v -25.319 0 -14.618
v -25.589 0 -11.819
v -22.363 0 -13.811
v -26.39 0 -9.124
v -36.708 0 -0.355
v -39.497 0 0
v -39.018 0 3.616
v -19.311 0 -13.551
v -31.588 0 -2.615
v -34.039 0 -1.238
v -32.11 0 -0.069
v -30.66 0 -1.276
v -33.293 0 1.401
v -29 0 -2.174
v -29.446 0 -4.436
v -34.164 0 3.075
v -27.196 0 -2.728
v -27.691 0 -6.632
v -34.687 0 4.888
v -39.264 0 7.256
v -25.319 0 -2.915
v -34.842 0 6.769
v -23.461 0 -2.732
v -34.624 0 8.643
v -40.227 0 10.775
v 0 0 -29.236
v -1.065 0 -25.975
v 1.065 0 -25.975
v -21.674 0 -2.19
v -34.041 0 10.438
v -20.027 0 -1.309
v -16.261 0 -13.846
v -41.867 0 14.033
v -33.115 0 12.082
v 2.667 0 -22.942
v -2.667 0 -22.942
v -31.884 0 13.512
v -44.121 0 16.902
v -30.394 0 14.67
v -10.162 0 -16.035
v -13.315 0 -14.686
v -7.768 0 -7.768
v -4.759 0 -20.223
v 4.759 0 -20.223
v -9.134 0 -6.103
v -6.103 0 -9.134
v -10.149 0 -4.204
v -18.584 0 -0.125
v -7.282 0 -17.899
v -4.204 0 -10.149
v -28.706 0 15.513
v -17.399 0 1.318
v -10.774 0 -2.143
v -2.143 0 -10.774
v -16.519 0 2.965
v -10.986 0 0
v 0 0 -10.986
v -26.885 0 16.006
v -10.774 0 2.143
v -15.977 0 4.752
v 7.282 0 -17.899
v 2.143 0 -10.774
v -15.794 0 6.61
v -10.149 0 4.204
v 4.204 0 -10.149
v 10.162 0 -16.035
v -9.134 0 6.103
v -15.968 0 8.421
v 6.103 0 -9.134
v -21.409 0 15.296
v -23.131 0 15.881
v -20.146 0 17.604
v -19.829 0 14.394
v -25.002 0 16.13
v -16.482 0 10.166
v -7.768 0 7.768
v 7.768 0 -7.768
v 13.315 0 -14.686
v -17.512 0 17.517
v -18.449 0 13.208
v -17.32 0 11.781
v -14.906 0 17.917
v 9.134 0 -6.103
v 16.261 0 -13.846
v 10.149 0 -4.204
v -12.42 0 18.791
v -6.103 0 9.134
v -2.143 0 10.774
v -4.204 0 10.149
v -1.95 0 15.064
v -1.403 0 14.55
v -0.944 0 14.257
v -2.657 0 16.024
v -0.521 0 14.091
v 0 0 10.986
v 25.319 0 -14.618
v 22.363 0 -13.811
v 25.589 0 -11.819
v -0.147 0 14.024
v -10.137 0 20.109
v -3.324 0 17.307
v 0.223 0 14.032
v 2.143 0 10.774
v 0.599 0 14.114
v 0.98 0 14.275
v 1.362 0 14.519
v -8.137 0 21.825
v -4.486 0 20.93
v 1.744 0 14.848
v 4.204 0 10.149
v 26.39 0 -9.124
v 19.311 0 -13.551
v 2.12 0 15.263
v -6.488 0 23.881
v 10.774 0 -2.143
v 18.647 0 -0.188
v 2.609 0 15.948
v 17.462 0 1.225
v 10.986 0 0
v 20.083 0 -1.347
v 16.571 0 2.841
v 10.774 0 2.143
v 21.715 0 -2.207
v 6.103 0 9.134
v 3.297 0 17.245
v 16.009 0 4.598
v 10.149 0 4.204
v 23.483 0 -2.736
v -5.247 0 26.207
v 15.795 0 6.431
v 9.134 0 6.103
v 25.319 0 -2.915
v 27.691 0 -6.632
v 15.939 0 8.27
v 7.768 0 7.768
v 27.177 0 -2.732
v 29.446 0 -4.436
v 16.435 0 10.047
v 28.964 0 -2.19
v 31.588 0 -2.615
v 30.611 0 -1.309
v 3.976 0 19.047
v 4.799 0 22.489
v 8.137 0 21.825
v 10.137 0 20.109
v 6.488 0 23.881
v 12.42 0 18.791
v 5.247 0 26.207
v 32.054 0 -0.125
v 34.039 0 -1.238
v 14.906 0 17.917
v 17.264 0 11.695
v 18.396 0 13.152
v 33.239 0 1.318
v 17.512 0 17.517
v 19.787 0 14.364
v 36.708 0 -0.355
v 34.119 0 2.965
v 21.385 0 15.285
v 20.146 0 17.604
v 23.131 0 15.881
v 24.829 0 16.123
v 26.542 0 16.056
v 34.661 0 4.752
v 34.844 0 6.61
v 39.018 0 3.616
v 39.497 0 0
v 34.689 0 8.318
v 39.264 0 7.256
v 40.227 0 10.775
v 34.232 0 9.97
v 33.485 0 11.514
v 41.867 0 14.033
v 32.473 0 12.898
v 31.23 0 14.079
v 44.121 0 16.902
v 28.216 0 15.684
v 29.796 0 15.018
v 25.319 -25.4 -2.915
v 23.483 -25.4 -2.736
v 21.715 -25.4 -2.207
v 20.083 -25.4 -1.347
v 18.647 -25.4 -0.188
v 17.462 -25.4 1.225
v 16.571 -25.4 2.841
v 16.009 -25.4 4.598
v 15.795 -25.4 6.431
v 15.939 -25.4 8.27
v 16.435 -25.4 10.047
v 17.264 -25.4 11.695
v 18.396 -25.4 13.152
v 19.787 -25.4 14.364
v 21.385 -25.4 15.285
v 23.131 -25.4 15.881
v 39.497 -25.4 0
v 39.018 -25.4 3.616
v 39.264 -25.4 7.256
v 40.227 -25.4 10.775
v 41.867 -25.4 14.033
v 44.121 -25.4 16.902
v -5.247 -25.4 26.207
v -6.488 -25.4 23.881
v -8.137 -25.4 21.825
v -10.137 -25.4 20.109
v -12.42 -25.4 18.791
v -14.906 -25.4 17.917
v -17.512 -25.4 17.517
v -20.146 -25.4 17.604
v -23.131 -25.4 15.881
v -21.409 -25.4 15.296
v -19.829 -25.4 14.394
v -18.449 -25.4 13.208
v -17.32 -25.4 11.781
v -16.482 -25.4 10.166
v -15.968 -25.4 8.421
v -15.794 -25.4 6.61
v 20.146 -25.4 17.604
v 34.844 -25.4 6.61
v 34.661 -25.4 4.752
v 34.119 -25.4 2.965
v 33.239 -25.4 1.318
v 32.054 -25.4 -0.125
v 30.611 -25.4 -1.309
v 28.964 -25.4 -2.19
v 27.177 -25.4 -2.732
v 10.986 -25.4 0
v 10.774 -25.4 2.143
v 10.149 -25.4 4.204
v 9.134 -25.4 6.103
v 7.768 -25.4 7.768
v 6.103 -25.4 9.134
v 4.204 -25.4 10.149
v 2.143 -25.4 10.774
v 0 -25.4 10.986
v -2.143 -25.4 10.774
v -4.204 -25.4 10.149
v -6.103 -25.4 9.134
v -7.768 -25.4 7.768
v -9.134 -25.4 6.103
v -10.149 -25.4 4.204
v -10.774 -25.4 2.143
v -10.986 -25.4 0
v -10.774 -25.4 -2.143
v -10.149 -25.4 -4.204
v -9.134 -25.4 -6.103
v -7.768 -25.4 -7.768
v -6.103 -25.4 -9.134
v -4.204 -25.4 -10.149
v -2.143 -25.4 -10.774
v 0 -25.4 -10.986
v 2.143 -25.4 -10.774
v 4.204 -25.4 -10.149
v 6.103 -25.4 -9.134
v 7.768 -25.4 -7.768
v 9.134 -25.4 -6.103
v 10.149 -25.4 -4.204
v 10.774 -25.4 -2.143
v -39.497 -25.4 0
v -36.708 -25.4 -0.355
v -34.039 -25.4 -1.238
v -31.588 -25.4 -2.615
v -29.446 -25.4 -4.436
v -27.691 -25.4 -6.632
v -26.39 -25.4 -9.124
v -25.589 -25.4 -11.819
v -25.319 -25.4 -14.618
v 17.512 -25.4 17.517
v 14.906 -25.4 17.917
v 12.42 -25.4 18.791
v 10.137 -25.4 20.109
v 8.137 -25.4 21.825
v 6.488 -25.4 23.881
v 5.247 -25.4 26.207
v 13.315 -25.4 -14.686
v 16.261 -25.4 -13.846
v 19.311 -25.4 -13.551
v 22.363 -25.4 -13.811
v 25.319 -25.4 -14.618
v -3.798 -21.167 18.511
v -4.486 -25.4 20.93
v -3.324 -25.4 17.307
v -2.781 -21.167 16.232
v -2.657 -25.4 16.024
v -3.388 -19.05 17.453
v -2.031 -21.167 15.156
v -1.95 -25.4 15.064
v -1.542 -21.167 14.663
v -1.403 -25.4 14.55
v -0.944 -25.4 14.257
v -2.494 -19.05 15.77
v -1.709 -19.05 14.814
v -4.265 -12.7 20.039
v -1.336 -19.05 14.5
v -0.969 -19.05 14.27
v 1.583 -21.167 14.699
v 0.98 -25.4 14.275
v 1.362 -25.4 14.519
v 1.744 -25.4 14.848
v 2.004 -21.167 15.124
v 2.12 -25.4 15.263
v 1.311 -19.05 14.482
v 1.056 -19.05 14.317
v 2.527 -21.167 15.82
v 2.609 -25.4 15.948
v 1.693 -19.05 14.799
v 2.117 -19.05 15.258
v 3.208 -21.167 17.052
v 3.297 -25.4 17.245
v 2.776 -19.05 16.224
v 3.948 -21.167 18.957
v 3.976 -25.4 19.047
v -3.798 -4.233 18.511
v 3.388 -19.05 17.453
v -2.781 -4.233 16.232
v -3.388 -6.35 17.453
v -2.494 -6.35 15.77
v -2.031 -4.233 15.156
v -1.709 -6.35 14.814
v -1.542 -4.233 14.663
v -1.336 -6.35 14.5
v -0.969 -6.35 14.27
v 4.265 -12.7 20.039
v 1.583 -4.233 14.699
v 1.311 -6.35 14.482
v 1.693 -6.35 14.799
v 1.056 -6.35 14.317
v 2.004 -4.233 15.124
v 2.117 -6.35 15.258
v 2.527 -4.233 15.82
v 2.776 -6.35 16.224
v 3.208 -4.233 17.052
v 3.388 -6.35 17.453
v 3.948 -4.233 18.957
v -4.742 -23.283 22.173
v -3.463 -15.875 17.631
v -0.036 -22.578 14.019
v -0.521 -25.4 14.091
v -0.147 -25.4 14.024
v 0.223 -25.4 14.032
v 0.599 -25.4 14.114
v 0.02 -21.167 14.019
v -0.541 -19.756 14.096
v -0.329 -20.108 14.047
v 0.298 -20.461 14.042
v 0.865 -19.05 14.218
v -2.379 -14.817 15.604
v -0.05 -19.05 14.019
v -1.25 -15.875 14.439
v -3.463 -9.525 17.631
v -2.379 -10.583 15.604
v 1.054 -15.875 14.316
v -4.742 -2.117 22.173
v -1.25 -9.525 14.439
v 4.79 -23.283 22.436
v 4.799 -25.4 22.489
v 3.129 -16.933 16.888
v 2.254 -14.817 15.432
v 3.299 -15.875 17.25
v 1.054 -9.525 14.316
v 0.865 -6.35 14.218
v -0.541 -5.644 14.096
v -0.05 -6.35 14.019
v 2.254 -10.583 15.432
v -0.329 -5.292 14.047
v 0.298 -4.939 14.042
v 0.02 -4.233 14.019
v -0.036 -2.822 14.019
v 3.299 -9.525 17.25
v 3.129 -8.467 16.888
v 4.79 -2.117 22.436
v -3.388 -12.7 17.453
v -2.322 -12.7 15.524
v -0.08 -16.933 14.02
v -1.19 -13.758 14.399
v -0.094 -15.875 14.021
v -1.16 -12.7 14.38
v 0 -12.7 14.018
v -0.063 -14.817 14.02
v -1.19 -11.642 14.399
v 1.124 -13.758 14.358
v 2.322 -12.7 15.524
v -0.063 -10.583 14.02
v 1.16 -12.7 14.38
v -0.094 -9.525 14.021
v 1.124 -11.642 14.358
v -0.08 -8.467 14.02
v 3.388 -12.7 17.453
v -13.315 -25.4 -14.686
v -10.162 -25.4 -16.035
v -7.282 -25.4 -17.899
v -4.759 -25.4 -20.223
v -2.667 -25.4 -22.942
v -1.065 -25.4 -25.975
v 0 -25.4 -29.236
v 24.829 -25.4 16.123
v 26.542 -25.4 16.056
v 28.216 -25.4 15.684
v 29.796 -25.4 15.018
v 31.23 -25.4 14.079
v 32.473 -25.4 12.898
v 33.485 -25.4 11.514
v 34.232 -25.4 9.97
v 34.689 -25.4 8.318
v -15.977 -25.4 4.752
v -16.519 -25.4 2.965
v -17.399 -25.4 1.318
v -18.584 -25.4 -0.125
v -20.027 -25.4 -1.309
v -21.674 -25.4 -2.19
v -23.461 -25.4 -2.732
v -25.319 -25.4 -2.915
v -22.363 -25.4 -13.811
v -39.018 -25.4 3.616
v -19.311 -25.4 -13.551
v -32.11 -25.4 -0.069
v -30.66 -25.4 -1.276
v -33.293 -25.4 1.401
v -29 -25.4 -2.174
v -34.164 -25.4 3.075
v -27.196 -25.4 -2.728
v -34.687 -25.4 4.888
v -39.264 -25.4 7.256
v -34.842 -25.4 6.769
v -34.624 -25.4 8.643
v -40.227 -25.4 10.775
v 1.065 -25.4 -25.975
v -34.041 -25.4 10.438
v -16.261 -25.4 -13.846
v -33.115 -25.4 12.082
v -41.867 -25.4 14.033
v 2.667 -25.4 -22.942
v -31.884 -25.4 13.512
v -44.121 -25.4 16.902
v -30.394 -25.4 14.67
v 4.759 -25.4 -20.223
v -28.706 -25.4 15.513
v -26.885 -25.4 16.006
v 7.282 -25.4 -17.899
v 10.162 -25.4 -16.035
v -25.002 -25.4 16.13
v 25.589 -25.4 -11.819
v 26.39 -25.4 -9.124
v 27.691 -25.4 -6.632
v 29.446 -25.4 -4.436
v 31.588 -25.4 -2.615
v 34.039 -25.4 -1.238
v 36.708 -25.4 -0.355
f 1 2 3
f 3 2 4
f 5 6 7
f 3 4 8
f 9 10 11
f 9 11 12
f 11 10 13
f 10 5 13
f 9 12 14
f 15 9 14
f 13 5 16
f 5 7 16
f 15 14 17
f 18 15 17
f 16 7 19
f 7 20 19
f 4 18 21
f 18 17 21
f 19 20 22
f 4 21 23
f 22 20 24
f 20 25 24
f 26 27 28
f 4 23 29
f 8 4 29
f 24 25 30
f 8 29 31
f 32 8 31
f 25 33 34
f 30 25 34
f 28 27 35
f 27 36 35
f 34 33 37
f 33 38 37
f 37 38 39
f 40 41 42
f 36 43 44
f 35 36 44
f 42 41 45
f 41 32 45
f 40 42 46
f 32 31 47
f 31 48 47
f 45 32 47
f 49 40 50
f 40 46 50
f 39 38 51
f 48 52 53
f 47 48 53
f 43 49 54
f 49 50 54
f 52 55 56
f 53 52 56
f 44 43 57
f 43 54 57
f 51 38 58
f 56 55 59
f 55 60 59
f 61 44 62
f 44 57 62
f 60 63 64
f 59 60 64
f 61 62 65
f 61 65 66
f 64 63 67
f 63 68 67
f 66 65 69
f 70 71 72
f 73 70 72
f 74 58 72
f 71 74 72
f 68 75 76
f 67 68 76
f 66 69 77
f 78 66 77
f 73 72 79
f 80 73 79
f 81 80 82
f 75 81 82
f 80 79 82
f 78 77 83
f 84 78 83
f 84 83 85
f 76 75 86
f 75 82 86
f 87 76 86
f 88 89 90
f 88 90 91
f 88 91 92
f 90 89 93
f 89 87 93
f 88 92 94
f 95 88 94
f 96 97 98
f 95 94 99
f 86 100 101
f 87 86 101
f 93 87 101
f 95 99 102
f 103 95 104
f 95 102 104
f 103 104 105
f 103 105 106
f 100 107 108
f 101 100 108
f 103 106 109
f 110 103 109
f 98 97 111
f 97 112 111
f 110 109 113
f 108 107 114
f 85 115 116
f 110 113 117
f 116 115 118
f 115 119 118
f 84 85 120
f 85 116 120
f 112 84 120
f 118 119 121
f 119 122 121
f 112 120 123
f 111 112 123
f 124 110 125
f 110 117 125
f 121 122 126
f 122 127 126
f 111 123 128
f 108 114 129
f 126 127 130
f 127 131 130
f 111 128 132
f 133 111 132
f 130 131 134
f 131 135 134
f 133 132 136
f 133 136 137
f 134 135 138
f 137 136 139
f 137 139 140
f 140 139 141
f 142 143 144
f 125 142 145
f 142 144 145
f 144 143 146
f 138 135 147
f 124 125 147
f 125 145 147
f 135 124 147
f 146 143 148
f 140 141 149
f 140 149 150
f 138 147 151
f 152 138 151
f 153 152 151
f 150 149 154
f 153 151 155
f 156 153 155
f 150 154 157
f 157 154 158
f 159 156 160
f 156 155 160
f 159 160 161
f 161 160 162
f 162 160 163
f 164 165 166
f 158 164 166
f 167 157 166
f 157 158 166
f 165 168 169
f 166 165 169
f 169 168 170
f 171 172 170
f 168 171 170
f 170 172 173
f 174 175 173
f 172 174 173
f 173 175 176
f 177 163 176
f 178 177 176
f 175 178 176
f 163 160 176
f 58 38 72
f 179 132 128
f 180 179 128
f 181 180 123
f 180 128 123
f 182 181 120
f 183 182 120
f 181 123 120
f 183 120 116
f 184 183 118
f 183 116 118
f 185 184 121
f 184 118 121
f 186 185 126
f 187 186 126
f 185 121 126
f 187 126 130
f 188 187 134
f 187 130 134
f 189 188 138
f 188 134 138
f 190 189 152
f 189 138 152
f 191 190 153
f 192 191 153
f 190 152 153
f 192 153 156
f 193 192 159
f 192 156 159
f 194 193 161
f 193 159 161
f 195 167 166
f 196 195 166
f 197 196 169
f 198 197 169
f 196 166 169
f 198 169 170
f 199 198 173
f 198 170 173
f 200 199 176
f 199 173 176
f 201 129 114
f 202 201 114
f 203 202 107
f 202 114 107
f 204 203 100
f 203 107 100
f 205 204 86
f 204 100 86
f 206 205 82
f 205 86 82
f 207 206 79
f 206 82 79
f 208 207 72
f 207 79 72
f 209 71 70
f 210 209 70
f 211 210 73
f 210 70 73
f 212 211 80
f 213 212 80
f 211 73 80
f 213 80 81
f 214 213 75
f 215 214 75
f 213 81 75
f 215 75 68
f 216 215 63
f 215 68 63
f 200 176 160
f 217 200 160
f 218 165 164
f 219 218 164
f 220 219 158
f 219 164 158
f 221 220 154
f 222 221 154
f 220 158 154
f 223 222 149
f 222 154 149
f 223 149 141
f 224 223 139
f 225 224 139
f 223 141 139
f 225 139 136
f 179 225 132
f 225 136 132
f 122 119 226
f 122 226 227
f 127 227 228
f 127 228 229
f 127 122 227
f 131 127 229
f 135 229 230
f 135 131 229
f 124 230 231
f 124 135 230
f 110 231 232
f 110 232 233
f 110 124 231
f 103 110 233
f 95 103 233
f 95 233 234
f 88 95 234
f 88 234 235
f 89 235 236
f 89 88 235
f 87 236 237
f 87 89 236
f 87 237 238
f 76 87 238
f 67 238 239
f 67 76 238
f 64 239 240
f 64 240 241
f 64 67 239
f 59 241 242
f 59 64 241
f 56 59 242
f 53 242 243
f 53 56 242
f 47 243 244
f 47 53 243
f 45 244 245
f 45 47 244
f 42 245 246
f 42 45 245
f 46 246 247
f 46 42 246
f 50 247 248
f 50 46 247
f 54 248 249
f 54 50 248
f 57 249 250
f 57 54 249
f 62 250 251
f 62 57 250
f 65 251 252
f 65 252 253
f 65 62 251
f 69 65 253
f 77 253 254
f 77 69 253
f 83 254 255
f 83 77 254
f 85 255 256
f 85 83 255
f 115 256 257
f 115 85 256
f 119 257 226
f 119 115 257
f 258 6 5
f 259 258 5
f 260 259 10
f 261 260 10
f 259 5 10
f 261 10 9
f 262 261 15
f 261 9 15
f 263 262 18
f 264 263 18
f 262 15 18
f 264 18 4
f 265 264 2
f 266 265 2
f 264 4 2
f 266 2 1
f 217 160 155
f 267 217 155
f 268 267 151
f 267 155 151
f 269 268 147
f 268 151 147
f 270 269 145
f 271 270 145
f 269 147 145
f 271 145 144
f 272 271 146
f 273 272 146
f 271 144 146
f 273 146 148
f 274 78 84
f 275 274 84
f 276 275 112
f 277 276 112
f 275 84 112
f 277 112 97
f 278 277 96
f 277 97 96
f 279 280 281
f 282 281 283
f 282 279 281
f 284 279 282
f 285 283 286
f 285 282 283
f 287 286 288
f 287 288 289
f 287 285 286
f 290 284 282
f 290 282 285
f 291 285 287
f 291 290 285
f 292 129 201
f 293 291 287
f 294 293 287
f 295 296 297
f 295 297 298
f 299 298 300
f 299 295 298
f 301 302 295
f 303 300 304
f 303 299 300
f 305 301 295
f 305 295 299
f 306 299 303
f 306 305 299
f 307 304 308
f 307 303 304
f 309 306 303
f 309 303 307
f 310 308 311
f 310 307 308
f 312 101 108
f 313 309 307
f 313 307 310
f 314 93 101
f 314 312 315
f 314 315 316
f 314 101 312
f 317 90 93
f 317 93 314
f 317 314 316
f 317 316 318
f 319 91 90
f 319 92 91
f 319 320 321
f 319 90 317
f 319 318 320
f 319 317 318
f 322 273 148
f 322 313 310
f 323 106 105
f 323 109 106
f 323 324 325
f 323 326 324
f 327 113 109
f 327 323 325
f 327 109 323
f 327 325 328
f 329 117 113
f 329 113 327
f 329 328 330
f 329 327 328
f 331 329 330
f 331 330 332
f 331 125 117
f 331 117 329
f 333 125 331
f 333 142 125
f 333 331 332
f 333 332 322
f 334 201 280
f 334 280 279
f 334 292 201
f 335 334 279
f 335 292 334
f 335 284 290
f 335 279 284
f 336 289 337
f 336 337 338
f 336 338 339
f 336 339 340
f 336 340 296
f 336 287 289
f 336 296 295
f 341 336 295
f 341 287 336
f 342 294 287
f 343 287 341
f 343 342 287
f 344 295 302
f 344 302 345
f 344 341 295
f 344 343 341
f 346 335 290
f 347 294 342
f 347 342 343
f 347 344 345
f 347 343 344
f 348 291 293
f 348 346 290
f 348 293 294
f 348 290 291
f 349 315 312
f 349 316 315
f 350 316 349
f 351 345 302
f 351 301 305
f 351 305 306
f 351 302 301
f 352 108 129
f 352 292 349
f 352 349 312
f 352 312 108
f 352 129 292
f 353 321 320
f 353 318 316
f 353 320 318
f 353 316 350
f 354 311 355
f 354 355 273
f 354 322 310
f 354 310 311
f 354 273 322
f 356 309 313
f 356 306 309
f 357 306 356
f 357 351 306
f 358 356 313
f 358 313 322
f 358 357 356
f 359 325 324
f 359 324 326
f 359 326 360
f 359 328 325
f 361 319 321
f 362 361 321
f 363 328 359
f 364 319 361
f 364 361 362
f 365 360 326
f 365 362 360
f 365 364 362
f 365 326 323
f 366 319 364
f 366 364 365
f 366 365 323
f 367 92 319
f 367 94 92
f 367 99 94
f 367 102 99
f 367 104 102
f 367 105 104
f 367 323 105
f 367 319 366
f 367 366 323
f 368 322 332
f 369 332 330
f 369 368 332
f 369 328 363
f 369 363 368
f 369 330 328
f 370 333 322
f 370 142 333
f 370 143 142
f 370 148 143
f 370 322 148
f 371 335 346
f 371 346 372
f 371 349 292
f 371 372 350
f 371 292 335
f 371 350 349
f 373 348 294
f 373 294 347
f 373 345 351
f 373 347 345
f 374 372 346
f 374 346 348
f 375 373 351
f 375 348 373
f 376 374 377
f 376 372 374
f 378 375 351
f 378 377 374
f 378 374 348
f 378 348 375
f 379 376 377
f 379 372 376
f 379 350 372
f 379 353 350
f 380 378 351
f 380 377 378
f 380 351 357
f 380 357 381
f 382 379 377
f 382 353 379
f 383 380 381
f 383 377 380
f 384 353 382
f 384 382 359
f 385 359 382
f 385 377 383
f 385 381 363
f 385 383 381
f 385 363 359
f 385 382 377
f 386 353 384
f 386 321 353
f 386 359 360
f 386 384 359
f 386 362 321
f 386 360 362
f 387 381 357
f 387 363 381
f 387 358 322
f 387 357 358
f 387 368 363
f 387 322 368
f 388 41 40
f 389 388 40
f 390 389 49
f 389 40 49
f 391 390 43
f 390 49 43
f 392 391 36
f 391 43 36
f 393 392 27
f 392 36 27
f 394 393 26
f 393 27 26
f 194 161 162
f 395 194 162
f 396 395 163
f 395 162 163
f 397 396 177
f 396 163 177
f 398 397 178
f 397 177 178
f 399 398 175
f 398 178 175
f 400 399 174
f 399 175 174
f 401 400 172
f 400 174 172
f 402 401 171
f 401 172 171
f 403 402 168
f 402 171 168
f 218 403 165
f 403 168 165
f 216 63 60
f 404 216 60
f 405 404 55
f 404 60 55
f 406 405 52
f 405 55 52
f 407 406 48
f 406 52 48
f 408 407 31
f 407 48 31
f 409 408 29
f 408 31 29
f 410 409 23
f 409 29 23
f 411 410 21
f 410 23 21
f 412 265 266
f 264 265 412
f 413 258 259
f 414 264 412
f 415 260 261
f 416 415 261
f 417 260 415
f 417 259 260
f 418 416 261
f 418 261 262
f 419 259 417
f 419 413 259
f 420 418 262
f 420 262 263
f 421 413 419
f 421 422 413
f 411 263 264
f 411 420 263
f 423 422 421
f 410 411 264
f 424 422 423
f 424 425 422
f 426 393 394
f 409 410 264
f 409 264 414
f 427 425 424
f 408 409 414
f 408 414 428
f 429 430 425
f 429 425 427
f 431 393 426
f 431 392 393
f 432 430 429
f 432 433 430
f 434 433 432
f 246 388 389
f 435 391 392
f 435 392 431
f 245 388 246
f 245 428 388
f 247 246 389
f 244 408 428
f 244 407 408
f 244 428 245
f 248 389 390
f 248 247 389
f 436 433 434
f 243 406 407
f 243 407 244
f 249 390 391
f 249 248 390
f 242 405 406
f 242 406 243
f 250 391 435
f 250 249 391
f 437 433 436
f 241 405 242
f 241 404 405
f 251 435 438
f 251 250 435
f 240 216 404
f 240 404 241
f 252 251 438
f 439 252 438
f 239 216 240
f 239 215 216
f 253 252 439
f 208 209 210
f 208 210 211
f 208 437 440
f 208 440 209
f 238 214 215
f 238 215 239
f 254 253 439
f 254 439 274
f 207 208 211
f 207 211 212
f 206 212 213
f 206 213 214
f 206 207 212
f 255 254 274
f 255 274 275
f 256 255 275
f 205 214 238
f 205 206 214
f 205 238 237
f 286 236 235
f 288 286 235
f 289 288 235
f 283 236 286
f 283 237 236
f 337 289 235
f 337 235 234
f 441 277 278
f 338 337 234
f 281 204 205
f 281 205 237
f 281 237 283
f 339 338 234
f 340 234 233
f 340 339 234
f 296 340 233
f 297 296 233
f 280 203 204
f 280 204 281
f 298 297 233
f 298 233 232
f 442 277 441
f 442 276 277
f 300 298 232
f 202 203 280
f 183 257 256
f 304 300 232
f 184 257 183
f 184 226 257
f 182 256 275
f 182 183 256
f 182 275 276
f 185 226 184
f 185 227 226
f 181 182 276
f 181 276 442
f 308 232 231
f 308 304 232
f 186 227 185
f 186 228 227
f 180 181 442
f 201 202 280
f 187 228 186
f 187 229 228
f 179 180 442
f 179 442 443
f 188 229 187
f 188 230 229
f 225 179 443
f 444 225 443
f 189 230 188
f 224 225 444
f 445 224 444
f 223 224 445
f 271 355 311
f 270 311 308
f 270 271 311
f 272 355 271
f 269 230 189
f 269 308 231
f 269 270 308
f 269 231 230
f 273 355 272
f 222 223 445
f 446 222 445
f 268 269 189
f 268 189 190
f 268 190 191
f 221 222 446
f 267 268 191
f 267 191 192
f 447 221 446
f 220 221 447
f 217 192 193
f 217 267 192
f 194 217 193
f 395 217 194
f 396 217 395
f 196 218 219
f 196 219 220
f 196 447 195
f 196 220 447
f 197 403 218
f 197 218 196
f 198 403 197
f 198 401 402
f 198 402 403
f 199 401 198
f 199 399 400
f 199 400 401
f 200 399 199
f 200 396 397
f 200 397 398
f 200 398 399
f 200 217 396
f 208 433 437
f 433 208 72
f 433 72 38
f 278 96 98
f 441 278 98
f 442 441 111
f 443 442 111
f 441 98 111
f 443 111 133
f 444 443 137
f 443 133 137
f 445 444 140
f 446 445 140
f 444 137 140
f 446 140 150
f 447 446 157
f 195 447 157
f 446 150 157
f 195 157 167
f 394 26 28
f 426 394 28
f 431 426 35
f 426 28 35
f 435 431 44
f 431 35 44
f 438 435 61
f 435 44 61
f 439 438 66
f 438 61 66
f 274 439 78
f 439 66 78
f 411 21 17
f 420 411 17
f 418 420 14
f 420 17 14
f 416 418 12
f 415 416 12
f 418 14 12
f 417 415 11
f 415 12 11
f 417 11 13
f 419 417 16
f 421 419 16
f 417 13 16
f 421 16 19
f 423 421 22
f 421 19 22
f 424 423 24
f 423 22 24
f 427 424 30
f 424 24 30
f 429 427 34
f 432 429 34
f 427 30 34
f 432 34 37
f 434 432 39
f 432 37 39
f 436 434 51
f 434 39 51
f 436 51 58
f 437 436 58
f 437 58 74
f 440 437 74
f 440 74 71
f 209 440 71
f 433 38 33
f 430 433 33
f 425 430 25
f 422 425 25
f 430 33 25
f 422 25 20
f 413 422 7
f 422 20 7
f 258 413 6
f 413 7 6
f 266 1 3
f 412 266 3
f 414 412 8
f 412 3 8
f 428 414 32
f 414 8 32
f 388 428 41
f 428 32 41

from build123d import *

# Parameters (mm, degrees)
F0_R     = 10.9855
F1_DEPTH = 25.4


with BuildPart() as f1:
    # F0 (on Front) → F1 (new body)
    with BuildSketch(Plane.XZ):
        with BuildLine():
            Line((44.12074, 16.901975), (20.145995, 17.604334))
            Line((20.145995, 17.604334), (23.131371, 15.880726))
            ThreePointArc((23.131371, 15.880726), (31.230244, 14.07893), (34.843798, 6.6103))
            ThreePointArc((34.843798, 6.6103), (32.05399, -0.124892), (25.318798, -2.9147))
            Line((25.318798, -2.9147), (25.318798, -14.617815))
            ThreePointArc((25.318798, -14.617815), (29.44571, -4.435593), (39.497305, 0))
            ThreePointArc((39.497305, 0), (39.657927, 9.039407), (44.12074, 16.901975))
        make_face()
        with BuildLine():
            Line((-23.131371, 15.880726), (-20.145995, 17.604334))
            Line((-20.145995, 17.604334), (-44.12074, 16.901975))
            ThreePointArc((-44.12074, 16.901975), (-39.657927, 9.039407), (-39.497305, 0))
            ThreePointArc((-39.497305, 0), (-29.44571, -4.435593), (-25.318798, -14.617815))
            Line((-25.318798, -14.617815), (-25.318798, -2.9147))
            ThreePointArc((-25.318798, -2.9147), (-34.77994, 7.711396), (-23.131371, 15.880726))
        make_face()
        with BuildLine():
            ThreePointArc((20.145995, 17.604334), (11.247841, 19.396708), (5.246522, 26.206549))
            add(Edge.make_bspline(
                [(-5.246522, 26.206549), (-4.375539, 14.018499), (0, 14.018499), (4.375539, 14.018499), (5.246522, 26.206549)],
                knots=[1.771192, 1.771192, 1.771192, 3.141593, 3.141593, 4.511993, 4.511993, 4.511993], degree=2, weights=[1, 0.774292, 1, 0.774292, 1]))
            ThreePointArc((-5.246522, 26.206549), (-11.247841, 19.396708), (-20.145995, 17.604334))
            Line((-20.145995, 17.604334), (-23.131371, 15.880726))
            ThreePointArc((-23.131371, 15.880726), (-17.850168, 12.521746), (-15.793798, 6.6103))
            ThreePointArc((-15.793798, 6.6103), (-18.583606, -0.124892), (-25.318798, -2.9147))
            Line((-25.318798, -2.9147), (-25.318798, -14.617815))
            ThreePointArc((-25.318798, -14.617815), (-19.310808, -13.551406), (-13.31532, -14.685998))
            ThreePointArc((-13.31532, -14.685998), (-4.759292, -20.223493), (0, -29.235629))
            ThreePointArc((0, -29.235629), (4.759292, -20.223493), (13.31532, -14.685998))
            ThreePointArc((13.31532, -14.685998), (19.310808, -13.551406), (25.318798, -14.617815))
            Line((25.318798, -14.617815), (25.318798, -2.9147))
            ThreePointArc((25.318798, -2.9147), (15.857655, 5.509205), (23.131371, 15.880726))
            Line((23.131371, 15.880726), (20.145995, 17.604334))
        make_face()
        Circle(F0_R, mode=Mode.SUBTRACT)
    extrude(amount=F1_DEPTH)


solid = f1.part
